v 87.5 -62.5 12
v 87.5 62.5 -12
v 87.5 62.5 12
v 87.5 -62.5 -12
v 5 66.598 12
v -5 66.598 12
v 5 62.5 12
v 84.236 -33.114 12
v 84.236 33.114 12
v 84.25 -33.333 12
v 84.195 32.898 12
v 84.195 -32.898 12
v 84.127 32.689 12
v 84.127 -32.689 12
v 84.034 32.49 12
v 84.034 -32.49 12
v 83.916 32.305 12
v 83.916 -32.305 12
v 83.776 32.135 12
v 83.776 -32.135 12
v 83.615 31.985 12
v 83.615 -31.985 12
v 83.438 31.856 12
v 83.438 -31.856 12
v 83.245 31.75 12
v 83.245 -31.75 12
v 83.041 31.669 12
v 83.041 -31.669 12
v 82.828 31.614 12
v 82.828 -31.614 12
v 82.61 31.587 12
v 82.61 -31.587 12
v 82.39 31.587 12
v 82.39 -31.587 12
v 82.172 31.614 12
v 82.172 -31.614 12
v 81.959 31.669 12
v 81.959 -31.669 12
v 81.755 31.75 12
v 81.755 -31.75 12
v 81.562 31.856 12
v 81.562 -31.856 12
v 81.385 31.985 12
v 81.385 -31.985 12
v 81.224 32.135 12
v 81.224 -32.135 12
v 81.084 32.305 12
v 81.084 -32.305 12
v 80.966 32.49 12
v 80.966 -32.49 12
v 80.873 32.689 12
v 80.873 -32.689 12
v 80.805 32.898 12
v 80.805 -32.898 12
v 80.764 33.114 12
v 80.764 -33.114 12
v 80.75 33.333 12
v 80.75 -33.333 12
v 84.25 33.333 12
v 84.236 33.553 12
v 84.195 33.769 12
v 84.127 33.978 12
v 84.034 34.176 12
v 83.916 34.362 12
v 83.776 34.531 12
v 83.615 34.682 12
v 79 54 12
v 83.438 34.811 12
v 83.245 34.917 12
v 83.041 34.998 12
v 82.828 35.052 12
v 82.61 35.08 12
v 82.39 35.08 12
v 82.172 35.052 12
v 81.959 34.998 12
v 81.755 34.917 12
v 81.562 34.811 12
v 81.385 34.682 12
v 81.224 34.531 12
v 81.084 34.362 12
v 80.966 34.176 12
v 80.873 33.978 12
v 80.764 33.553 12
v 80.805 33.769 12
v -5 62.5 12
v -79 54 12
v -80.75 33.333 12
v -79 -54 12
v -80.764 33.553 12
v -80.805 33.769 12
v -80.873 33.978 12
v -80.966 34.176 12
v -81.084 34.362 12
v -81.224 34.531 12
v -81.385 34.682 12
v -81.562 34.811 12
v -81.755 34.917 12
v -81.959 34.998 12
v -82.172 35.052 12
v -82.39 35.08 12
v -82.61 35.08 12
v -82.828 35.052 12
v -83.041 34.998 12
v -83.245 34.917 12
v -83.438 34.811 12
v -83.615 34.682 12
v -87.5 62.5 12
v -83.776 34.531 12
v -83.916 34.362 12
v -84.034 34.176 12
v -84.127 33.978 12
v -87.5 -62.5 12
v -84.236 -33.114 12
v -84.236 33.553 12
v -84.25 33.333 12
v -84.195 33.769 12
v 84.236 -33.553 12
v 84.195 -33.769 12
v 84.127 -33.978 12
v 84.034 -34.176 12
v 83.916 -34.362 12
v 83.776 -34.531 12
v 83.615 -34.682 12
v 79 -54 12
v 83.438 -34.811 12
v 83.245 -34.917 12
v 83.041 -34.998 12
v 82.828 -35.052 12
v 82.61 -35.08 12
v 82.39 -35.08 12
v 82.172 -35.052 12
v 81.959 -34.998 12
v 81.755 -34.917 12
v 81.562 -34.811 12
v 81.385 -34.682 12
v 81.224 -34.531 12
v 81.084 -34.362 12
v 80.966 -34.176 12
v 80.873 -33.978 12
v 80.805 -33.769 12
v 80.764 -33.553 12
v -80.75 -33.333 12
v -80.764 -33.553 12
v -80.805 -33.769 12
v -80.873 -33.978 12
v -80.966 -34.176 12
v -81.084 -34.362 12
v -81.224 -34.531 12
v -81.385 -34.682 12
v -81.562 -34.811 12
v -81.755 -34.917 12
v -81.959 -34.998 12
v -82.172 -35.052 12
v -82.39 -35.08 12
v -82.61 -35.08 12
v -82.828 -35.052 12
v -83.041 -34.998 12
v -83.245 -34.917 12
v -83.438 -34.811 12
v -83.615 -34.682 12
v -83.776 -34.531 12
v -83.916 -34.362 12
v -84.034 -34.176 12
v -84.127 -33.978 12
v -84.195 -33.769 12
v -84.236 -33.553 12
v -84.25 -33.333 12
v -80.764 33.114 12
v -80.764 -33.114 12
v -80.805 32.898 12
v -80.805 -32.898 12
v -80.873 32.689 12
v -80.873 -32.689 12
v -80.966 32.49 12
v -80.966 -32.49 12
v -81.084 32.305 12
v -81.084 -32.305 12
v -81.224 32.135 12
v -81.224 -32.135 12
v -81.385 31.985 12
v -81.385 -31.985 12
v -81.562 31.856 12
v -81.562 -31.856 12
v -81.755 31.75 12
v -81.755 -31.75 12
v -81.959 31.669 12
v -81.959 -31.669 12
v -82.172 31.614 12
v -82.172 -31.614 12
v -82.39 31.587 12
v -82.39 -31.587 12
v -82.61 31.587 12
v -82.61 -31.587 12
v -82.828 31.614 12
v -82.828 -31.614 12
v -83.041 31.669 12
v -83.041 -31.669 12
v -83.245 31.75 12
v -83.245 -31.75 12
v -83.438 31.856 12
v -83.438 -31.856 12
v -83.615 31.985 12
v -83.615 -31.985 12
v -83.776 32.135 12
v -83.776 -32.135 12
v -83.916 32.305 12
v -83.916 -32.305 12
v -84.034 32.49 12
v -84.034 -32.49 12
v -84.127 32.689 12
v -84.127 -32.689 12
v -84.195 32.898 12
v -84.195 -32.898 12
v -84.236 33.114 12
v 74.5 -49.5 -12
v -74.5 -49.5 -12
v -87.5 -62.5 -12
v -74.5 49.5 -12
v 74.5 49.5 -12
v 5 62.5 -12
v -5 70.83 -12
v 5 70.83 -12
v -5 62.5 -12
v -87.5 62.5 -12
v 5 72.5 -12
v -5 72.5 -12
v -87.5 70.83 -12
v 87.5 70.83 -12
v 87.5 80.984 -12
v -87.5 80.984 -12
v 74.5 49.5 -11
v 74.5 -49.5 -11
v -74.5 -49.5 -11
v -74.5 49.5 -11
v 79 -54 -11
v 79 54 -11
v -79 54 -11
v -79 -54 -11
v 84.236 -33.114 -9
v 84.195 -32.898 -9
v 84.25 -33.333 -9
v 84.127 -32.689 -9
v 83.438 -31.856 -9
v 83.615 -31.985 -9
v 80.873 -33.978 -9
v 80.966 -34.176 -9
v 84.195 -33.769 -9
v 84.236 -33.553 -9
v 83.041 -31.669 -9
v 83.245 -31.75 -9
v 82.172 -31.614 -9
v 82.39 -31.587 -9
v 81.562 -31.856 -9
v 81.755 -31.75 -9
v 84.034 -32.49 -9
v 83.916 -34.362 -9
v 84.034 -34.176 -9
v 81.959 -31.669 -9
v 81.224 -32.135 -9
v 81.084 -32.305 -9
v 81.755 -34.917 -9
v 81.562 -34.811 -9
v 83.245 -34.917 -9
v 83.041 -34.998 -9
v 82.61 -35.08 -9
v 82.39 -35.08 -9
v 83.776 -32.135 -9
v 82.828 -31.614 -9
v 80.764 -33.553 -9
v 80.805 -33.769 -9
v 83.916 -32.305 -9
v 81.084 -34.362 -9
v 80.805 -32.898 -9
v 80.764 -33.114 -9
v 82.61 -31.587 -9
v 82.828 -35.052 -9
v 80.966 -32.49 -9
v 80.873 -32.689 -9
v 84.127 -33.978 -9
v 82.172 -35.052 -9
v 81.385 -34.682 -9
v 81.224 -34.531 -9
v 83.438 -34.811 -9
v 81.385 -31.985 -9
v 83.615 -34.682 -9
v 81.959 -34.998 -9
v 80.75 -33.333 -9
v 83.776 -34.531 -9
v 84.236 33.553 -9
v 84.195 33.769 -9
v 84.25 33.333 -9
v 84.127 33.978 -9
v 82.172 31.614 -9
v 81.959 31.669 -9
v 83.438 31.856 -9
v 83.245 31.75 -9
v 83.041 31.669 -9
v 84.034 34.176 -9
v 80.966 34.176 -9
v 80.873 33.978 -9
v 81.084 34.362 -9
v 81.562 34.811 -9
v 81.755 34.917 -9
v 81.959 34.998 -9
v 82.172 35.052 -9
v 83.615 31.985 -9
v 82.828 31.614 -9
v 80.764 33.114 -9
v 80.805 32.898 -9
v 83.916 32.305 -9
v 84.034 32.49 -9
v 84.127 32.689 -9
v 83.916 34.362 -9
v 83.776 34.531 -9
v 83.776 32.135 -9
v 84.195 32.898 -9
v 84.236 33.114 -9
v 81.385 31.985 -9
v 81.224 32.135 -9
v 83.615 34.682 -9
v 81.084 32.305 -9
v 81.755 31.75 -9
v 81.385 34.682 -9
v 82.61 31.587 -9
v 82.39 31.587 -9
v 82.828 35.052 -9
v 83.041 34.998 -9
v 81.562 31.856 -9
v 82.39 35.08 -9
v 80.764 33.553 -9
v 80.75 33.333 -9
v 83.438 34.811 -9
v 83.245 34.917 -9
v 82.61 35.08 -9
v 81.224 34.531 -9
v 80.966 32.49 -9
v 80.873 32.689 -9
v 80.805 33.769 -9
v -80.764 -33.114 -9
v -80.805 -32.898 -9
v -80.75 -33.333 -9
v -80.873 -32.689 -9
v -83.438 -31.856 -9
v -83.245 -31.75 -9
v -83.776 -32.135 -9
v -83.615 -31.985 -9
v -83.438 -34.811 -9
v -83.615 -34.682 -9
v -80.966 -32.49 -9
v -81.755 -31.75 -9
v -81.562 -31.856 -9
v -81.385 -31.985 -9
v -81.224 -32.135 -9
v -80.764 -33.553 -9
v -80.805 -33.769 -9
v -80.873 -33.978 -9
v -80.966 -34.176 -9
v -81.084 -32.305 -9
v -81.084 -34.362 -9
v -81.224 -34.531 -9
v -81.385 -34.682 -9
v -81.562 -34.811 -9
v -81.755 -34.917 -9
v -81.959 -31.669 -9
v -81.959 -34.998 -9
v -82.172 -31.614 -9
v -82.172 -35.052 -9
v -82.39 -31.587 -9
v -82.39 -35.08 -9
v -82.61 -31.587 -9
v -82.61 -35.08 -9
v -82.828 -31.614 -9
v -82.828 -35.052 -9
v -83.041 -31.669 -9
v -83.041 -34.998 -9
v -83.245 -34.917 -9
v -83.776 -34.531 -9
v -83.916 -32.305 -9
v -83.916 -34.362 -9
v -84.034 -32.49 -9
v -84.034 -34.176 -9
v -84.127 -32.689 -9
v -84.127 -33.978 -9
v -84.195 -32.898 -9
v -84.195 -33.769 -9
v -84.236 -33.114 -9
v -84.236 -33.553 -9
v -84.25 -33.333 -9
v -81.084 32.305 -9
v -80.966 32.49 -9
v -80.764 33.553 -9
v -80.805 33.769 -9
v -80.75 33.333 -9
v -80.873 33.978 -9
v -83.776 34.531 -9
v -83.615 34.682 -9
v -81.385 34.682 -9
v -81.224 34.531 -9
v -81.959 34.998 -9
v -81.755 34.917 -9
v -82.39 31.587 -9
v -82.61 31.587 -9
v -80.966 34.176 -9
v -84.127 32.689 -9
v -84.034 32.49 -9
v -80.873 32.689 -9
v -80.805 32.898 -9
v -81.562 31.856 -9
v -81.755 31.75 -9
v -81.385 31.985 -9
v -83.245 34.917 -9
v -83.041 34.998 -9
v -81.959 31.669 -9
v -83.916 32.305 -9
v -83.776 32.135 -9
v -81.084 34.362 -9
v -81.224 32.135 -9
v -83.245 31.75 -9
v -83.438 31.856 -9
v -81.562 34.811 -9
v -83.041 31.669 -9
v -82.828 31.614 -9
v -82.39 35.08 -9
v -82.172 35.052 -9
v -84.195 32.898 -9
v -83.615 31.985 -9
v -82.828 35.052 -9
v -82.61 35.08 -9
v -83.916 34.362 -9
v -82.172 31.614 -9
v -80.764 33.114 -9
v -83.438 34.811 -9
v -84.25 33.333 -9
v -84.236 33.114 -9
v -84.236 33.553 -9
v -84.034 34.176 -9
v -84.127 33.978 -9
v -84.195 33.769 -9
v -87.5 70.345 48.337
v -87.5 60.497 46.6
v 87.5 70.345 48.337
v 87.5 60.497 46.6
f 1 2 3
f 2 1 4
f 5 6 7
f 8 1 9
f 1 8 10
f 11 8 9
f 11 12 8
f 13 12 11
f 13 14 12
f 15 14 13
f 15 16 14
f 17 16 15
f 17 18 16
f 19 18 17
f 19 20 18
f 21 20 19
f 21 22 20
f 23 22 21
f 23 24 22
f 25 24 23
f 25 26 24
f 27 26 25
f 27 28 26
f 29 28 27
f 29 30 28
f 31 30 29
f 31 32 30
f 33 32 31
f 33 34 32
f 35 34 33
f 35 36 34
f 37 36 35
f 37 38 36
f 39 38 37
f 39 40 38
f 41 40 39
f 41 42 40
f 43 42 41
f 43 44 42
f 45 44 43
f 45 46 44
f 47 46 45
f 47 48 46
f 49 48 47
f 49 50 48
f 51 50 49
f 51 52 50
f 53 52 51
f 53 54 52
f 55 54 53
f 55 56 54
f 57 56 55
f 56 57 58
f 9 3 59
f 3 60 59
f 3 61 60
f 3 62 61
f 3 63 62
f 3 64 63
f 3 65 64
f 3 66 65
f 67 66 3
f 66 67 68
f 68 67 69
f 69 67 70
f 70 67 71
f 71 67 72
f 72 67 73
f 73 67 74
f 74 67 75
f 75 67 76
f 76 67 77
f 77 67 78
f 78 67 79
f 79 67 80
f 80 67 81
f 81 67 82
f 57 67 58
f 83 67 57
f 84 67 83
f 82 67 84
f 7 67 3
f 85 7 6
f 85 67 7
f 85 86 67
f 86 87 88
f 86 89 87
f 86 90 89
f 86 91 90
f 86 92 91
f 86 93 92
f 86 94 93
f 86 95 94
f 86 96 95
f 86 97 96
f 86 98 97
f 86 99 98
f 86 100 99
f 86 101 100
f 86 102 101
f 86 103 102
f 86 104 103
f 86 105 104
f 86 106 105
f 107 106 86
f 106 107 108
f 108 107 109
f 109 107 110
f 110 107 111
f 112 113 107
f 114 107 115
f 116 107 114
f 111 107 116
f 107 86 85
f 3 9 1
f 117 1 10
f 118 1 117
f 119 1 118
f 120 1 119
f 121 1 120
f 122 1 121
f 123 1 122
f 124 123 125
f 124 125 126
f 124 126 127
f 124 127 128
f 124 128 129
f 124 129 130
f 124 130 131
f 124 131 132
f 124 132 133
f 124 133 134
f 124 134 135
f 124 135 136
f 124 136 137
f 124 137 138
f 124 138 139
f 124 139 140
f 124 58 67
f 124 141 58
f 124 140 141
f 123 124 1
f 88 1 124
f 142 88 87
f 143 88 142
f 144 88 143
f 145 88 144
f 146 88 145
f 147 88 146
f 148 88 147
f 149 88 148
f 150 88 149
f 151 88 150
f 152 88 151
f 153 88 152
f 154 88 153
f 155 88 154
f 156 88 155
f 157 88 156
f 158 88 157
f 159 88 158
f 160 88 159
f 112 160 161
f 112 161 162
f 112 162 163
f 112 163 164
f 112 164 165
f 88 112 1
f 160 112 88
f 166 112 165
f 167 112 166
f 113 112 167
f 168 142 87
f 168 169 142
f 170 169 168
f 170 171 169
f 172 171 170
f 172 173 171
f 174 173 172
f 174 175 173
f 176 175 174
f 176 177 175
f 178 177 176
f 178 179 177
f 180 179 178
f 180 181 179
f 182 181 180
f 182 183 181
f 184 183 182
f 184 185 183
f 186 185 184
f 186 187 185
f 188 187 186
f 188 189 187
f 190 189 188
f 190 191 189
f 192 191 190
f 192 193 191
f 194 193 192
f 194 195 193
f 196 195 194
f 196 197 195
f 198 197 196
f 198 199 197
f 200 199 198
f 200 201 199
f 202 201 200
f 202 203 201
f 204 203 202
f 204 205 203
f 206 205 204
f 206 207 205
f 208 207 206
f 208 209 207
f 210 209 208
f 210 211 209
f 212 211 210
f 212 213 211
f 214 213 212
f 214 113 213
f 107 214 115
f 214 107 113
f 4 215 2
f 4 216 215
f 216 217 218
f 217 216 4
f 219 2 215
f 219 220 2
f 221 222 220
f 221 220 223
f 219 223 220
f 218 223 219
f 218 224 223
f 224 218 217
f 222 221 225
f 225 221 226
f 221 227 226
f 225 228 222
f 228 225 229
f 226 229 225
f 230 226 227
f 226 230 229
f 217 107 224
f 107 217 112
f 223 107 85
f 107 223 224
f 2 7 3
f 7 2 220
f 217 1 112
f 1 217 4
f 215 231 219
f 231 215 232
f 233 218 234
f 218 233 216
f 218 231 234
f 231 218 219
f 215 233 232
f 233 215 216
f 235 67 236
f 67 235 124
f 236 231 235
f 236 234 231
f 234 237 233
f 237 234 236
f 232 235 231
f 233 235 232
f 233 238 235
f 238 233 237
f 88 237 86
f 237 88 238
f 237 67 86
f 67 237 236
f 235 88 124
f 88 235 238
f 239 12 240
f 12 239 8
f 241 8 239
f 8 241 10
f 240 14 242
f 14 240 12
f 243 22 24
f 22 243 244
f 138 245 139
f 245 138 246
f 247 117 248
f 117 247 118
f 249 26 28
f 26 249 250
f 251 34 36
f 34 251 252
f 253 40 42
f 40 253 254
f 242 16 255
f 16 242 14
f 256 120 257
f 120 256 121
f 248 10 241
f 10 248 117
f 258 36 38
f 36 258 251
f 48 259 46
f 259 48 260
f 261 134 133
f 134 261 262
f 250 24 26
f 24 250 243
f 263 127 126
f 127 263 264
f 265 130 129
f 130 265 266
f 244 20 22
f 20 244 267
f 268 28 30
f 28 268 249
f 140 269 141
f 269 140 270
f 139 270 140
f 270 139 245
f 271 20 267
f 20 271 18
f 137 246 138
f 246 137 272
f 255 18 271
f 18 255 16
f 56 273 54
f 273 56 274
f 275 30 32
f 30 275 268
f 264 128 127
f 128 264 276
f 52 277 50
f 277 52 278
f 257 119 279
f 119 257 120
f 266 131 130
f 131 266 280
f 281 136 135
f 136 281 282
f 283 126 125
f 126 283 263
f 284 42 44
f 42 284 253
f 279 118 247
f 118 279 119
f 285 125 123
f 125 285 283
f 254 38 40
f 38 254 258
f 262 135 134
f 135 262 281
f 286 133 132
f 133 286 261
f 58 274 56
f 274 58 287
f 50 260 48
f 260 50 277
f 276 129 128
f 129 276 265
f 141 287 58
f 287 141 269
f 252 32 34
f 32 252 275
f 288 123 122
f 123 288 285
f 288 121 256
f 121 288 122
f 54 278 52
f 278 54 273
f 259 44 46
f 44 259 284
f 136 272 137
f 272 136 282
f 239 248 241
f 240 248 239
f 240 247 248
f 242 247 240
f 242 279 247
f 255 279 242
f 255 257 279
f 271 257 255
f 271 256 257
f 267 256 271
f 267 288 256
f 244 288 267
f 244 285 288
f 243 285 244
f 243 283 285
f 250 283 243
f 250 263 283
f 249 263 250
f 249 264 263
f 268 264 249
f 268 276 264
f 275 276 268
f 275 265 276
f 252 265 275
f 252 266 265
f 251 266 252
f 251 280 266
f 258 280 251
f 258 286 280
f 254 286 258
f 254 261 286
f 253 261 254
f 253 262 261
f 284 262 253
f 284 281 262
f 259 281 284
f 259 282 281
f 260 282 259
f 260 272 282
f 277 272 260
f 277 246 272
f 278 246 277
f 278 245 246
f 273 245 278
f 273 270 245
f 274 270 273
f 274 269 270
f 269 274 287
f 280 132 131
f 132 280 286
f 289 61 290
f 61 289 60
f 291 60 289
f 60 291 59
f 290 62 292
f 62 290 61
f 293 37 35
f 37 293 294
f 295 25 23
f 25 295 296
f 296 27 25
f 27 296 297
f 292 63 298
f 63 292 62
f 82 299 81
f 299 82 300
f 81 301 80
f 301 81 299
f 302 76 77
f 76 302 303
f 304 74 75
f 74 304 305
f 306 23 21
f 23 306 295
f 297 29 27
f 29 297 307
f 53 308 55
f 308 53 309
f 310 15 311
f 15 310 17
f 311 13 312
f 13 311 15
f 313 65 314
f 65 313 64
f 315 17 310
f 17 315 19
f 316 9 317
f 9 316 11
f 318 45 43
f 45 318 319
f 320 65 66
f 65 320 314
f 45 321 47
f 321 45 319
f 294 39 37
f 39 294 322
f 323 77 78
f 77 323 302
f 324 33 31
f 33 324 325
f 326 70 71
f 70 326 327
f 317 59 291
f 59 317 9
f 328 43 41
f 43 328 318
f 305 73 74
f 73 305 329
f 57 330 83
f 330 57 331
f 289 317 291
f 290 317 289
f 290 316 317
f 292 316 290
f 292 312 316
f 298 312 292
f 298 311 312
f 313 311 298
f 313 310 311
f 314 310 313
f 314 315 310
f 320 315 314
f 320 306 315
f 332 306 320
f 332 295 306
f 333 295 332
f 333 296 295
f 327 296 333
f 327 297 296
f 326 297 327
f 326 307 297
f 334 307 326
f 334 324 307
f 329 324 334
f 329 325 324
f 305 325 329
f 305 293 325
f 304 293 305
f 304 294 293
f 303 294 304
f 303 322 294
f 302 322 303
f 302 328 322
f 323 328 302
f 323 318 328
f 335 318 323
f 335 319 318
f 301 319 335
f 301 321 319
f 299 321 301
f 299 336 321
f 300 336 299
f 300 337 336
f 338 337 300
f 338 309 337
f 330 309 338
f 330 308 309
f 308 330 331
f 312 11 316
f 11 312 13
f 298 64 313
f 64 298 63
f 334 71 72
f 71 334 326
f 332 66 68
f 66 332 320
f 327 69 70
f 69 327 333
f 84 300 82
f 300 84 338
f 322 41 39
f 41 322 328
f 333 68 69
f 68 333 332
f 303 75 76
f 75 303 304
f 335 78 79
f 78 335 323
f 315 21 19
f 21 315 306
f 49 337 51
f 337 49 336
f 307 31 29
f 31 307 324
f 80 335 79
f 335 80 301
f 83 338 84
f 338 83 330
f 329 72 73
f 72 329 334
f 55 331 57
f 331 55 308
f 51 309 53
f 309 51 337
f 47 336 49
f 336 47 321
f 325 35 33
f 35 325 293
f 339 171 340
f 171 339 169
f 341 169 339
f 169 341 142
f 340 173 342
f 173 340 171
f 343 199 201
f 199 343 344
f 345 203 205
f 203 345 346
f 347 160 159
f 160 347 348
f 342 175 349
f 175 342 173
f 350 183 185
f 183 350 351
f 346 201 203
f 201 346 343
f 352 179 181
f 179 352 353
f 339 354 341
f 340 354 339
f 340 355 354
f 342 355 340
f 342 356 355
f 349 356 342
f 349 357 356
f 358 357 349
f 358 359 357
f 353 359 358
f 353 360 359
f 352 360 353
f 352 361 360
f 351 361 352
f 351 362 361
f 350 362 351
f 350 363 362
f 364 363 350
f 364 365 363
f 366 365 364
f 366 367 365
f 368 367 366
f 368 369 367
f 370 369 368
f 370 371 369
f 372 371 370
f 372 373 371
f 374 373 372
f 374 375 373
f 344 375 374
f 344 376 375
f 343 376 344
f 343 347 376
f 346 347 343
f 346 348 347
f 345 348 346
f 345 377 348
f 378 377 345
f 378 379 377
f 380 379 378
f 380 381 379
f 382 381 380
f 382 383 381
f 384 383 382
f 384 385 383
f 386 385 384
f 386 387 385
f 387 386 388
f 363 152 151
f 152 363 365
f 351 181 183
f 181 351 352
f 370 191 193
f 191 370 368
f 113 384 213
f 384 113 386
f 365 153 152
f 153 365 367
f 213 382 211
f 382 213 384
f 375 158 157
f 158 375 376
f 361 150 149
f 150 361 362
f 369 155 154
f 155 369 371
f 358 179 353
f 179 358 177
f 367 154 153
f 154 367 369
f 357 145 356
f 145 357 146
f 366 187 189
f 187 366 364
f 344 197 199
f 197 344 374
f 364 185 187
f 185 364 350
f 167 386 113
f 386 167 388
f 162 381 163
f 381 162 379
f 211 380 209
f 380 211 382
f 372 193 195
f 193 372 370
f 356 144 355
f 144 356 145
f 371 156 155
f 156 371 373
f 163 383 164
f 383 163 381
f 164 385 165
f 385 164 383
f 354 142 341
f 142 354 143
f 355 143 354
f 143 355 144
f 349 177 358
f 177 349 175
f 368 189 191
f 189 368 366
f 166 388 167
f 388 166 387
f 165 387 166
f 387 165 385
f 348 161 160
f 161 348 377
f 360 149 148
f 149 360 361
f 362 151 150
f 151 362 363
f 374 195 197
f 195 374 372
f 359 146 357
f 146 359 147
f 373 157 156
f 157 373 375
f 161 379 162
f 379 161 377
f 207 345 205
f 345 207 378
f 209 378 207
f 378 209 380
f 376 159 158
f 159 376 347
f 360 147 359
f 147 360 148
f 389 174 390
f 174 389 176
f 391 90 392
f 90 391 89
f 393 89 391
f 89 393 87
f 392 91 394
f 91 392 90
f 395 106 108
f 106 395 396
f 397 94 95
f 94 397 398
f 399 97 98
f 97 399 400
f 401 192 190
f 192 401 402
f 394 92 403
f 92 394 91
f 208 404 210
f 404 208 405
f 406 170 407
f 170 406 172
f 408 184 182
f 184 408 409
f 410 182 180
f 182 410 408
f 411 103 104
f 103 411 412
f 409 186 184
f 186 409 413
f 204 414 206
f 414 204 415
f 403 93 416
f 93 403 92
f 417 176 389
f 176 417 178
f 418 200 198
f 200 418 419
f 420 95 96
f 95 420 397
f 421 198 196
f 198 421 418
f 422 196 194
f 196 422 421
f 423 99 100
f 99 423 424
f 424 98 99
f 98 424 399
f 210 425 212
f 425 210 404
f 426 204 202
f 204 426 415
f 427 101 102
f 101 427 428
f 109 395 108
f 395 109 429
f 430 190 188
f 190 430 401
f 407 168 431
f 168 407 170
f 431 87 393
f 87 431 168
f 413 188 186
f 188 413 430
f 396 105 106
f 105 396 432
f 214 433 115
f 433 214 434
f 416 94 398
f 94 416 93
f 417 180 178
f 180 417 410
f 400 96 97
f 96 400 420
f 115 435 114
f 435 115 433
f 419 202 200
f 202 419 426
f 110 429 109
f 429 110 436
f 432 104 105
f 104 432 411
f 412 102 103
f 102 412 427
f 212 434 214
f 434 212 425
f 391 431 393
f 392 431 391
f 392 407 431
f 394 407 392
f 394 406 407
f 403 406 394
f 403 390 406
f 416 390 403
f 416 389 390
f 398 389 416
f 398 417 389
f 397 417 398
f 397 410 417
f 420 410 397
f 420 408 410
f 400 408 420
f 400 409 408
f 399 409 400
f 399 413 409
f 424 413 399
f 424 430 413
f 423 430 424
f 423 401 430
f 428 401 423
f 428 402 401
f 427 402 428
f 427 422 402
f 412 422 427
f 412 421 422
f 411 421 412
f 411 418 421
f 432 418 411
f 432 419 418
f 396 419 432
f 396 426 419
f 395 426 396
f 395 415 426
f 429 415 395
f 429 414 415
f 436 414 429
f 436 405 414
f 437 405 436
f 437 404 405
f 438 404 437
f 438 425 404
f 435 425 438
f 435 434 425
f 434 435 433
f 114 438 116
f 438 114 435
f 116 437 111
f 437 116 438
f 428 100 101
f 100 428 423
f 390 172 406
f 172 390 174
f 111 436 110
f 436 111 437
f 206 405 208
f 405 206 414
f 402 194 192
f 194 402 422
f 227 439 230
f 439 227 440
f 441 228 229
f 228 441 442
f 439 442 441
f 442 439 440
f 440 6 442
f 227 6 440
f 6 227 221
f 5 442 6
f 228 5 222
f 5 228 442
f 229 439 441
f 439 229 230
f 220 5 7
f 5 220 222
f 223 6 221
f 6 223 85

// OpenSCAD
// Dimensões
a_tela = 100;
l_tela = 150;

a_vidro = a_tela + 8;
l_vidro = l_tela + 8;
p_vidro = 2;

a_moldura = a_tela + 25;
l_moldura = l_tela + 25;

a_vao = a_tela - 1;
l_vao = l_tela - 1;

p_paspatur = 1;

p_tela = 18 + p_vidro + p_paspatur;

module moldura() {
    
    difference() {
        cube(
                [
                    l_moldura,
                    a_moldura,
                    p_tela + p_vidro + p_paspatur
                ], center = true
            );
        cube(
                [
                    l_vao,
                    a_vao,
                    p_tela + p_vidro + p_paspatur + 2
                ], center = true
            );
        translate( [ 0, 0, 2 ] )
            cube(
                    [
                        l_vidro,
                        a_vidro,
                        p_tela + p_vidro + p_paspatur + 2
                    ], center = true
                );
        // Furos
        translate( [ l_vidro / 2 + d_furo, -a_tela / 3, - ( p_tela + p_vidro + p_paspatur ) / 2 + p_vidro + 1 ] )
            cylinder( d = d_furo, $fn = 50, h = p_tela + p_vidro + p_paspatur );
        translate( [ l_vidro / 2 + d_furo, a_tela / 3, - ( p_tela + p_vidro + p_paspatur ) / 2 + p_vidro + 1 ] )
            cylinder( d = d_furo, $fn = 50, h = p_tela + p_vidro + p_paspatur );
        translate( [ -( l_vidro / 2 + d_furo ), -a_tela / 3, - ( p_tela + p_vidro + p_paspatur ) / 2 + p_vidro + 1 ] )
            cylinder( d = d_furo, $fn = 50, h = p_tela + p_vidro + p_paspatur );
        translate( [ -( l_vidro / 2 + d_furo ), a_tela / 3, - ( p_tela + p_vidro + p_paspatur ) / 2 + p_vidro + 1 ] )
            cylinder( d = d_furo, $fn = 50, h = p_tela + p_vidro + p_paspatur );
    }
}

a_conector = 10;
l_conector = 10;

a_pe = 10;
l_pe = l_moldura;
p_pe = 70;

d_furo = 3.5;

module pe(){
    // Conector
    translate( [ 0, a_moldura / 2 + a_conector / 2 - 0.5, 0 ] )
        cube( 
            [
                l_conector,
                a_conector + 1,
                p_tela + p_vidro + p_paspatur
            ], center = true
        );
    
    // Pe
    difference() {
        translate( [ 0, a_moldura / 2 + a_conector + a_pe / 2 - 1e-3 - 6, p_pe / 2 - ( p_tela + p_vidro + p_paspatur ) / 2 - 10 ] )
            rotate( 10, [ 1, 0, 0 ] )
                cube(
                    [
                        l_pe,
                        a_pe,
                        p_pe
                    ], center = true
                );
        translate( [ 0, 0, - ( p_tela + p_vidro + p_paspatur ) / 2 - 250 ] )
            cube( [ 500, 500, 500 ], center = true );
        
    }
}

module paspatur() {
    difference(){
        cube( [ l_vidro - 0.5, a_vidro - 0.5, 15 ], center = true );
        translate( [ 0, 0, 1 ] )
        cube(
                [
                    l_tela + 3.0,
                    a_tela + 3.0,
                    15
                ], center = true
            );
        translate( [ 0, 0, -2 ] )
            cube(
                    [
                        l_vao,
                        a_vao,
                        p_tela + p_vidro + p_paspatur + 2
                    ], center = true
                );
    }
}

moldura();
pe();
//paspatur();
